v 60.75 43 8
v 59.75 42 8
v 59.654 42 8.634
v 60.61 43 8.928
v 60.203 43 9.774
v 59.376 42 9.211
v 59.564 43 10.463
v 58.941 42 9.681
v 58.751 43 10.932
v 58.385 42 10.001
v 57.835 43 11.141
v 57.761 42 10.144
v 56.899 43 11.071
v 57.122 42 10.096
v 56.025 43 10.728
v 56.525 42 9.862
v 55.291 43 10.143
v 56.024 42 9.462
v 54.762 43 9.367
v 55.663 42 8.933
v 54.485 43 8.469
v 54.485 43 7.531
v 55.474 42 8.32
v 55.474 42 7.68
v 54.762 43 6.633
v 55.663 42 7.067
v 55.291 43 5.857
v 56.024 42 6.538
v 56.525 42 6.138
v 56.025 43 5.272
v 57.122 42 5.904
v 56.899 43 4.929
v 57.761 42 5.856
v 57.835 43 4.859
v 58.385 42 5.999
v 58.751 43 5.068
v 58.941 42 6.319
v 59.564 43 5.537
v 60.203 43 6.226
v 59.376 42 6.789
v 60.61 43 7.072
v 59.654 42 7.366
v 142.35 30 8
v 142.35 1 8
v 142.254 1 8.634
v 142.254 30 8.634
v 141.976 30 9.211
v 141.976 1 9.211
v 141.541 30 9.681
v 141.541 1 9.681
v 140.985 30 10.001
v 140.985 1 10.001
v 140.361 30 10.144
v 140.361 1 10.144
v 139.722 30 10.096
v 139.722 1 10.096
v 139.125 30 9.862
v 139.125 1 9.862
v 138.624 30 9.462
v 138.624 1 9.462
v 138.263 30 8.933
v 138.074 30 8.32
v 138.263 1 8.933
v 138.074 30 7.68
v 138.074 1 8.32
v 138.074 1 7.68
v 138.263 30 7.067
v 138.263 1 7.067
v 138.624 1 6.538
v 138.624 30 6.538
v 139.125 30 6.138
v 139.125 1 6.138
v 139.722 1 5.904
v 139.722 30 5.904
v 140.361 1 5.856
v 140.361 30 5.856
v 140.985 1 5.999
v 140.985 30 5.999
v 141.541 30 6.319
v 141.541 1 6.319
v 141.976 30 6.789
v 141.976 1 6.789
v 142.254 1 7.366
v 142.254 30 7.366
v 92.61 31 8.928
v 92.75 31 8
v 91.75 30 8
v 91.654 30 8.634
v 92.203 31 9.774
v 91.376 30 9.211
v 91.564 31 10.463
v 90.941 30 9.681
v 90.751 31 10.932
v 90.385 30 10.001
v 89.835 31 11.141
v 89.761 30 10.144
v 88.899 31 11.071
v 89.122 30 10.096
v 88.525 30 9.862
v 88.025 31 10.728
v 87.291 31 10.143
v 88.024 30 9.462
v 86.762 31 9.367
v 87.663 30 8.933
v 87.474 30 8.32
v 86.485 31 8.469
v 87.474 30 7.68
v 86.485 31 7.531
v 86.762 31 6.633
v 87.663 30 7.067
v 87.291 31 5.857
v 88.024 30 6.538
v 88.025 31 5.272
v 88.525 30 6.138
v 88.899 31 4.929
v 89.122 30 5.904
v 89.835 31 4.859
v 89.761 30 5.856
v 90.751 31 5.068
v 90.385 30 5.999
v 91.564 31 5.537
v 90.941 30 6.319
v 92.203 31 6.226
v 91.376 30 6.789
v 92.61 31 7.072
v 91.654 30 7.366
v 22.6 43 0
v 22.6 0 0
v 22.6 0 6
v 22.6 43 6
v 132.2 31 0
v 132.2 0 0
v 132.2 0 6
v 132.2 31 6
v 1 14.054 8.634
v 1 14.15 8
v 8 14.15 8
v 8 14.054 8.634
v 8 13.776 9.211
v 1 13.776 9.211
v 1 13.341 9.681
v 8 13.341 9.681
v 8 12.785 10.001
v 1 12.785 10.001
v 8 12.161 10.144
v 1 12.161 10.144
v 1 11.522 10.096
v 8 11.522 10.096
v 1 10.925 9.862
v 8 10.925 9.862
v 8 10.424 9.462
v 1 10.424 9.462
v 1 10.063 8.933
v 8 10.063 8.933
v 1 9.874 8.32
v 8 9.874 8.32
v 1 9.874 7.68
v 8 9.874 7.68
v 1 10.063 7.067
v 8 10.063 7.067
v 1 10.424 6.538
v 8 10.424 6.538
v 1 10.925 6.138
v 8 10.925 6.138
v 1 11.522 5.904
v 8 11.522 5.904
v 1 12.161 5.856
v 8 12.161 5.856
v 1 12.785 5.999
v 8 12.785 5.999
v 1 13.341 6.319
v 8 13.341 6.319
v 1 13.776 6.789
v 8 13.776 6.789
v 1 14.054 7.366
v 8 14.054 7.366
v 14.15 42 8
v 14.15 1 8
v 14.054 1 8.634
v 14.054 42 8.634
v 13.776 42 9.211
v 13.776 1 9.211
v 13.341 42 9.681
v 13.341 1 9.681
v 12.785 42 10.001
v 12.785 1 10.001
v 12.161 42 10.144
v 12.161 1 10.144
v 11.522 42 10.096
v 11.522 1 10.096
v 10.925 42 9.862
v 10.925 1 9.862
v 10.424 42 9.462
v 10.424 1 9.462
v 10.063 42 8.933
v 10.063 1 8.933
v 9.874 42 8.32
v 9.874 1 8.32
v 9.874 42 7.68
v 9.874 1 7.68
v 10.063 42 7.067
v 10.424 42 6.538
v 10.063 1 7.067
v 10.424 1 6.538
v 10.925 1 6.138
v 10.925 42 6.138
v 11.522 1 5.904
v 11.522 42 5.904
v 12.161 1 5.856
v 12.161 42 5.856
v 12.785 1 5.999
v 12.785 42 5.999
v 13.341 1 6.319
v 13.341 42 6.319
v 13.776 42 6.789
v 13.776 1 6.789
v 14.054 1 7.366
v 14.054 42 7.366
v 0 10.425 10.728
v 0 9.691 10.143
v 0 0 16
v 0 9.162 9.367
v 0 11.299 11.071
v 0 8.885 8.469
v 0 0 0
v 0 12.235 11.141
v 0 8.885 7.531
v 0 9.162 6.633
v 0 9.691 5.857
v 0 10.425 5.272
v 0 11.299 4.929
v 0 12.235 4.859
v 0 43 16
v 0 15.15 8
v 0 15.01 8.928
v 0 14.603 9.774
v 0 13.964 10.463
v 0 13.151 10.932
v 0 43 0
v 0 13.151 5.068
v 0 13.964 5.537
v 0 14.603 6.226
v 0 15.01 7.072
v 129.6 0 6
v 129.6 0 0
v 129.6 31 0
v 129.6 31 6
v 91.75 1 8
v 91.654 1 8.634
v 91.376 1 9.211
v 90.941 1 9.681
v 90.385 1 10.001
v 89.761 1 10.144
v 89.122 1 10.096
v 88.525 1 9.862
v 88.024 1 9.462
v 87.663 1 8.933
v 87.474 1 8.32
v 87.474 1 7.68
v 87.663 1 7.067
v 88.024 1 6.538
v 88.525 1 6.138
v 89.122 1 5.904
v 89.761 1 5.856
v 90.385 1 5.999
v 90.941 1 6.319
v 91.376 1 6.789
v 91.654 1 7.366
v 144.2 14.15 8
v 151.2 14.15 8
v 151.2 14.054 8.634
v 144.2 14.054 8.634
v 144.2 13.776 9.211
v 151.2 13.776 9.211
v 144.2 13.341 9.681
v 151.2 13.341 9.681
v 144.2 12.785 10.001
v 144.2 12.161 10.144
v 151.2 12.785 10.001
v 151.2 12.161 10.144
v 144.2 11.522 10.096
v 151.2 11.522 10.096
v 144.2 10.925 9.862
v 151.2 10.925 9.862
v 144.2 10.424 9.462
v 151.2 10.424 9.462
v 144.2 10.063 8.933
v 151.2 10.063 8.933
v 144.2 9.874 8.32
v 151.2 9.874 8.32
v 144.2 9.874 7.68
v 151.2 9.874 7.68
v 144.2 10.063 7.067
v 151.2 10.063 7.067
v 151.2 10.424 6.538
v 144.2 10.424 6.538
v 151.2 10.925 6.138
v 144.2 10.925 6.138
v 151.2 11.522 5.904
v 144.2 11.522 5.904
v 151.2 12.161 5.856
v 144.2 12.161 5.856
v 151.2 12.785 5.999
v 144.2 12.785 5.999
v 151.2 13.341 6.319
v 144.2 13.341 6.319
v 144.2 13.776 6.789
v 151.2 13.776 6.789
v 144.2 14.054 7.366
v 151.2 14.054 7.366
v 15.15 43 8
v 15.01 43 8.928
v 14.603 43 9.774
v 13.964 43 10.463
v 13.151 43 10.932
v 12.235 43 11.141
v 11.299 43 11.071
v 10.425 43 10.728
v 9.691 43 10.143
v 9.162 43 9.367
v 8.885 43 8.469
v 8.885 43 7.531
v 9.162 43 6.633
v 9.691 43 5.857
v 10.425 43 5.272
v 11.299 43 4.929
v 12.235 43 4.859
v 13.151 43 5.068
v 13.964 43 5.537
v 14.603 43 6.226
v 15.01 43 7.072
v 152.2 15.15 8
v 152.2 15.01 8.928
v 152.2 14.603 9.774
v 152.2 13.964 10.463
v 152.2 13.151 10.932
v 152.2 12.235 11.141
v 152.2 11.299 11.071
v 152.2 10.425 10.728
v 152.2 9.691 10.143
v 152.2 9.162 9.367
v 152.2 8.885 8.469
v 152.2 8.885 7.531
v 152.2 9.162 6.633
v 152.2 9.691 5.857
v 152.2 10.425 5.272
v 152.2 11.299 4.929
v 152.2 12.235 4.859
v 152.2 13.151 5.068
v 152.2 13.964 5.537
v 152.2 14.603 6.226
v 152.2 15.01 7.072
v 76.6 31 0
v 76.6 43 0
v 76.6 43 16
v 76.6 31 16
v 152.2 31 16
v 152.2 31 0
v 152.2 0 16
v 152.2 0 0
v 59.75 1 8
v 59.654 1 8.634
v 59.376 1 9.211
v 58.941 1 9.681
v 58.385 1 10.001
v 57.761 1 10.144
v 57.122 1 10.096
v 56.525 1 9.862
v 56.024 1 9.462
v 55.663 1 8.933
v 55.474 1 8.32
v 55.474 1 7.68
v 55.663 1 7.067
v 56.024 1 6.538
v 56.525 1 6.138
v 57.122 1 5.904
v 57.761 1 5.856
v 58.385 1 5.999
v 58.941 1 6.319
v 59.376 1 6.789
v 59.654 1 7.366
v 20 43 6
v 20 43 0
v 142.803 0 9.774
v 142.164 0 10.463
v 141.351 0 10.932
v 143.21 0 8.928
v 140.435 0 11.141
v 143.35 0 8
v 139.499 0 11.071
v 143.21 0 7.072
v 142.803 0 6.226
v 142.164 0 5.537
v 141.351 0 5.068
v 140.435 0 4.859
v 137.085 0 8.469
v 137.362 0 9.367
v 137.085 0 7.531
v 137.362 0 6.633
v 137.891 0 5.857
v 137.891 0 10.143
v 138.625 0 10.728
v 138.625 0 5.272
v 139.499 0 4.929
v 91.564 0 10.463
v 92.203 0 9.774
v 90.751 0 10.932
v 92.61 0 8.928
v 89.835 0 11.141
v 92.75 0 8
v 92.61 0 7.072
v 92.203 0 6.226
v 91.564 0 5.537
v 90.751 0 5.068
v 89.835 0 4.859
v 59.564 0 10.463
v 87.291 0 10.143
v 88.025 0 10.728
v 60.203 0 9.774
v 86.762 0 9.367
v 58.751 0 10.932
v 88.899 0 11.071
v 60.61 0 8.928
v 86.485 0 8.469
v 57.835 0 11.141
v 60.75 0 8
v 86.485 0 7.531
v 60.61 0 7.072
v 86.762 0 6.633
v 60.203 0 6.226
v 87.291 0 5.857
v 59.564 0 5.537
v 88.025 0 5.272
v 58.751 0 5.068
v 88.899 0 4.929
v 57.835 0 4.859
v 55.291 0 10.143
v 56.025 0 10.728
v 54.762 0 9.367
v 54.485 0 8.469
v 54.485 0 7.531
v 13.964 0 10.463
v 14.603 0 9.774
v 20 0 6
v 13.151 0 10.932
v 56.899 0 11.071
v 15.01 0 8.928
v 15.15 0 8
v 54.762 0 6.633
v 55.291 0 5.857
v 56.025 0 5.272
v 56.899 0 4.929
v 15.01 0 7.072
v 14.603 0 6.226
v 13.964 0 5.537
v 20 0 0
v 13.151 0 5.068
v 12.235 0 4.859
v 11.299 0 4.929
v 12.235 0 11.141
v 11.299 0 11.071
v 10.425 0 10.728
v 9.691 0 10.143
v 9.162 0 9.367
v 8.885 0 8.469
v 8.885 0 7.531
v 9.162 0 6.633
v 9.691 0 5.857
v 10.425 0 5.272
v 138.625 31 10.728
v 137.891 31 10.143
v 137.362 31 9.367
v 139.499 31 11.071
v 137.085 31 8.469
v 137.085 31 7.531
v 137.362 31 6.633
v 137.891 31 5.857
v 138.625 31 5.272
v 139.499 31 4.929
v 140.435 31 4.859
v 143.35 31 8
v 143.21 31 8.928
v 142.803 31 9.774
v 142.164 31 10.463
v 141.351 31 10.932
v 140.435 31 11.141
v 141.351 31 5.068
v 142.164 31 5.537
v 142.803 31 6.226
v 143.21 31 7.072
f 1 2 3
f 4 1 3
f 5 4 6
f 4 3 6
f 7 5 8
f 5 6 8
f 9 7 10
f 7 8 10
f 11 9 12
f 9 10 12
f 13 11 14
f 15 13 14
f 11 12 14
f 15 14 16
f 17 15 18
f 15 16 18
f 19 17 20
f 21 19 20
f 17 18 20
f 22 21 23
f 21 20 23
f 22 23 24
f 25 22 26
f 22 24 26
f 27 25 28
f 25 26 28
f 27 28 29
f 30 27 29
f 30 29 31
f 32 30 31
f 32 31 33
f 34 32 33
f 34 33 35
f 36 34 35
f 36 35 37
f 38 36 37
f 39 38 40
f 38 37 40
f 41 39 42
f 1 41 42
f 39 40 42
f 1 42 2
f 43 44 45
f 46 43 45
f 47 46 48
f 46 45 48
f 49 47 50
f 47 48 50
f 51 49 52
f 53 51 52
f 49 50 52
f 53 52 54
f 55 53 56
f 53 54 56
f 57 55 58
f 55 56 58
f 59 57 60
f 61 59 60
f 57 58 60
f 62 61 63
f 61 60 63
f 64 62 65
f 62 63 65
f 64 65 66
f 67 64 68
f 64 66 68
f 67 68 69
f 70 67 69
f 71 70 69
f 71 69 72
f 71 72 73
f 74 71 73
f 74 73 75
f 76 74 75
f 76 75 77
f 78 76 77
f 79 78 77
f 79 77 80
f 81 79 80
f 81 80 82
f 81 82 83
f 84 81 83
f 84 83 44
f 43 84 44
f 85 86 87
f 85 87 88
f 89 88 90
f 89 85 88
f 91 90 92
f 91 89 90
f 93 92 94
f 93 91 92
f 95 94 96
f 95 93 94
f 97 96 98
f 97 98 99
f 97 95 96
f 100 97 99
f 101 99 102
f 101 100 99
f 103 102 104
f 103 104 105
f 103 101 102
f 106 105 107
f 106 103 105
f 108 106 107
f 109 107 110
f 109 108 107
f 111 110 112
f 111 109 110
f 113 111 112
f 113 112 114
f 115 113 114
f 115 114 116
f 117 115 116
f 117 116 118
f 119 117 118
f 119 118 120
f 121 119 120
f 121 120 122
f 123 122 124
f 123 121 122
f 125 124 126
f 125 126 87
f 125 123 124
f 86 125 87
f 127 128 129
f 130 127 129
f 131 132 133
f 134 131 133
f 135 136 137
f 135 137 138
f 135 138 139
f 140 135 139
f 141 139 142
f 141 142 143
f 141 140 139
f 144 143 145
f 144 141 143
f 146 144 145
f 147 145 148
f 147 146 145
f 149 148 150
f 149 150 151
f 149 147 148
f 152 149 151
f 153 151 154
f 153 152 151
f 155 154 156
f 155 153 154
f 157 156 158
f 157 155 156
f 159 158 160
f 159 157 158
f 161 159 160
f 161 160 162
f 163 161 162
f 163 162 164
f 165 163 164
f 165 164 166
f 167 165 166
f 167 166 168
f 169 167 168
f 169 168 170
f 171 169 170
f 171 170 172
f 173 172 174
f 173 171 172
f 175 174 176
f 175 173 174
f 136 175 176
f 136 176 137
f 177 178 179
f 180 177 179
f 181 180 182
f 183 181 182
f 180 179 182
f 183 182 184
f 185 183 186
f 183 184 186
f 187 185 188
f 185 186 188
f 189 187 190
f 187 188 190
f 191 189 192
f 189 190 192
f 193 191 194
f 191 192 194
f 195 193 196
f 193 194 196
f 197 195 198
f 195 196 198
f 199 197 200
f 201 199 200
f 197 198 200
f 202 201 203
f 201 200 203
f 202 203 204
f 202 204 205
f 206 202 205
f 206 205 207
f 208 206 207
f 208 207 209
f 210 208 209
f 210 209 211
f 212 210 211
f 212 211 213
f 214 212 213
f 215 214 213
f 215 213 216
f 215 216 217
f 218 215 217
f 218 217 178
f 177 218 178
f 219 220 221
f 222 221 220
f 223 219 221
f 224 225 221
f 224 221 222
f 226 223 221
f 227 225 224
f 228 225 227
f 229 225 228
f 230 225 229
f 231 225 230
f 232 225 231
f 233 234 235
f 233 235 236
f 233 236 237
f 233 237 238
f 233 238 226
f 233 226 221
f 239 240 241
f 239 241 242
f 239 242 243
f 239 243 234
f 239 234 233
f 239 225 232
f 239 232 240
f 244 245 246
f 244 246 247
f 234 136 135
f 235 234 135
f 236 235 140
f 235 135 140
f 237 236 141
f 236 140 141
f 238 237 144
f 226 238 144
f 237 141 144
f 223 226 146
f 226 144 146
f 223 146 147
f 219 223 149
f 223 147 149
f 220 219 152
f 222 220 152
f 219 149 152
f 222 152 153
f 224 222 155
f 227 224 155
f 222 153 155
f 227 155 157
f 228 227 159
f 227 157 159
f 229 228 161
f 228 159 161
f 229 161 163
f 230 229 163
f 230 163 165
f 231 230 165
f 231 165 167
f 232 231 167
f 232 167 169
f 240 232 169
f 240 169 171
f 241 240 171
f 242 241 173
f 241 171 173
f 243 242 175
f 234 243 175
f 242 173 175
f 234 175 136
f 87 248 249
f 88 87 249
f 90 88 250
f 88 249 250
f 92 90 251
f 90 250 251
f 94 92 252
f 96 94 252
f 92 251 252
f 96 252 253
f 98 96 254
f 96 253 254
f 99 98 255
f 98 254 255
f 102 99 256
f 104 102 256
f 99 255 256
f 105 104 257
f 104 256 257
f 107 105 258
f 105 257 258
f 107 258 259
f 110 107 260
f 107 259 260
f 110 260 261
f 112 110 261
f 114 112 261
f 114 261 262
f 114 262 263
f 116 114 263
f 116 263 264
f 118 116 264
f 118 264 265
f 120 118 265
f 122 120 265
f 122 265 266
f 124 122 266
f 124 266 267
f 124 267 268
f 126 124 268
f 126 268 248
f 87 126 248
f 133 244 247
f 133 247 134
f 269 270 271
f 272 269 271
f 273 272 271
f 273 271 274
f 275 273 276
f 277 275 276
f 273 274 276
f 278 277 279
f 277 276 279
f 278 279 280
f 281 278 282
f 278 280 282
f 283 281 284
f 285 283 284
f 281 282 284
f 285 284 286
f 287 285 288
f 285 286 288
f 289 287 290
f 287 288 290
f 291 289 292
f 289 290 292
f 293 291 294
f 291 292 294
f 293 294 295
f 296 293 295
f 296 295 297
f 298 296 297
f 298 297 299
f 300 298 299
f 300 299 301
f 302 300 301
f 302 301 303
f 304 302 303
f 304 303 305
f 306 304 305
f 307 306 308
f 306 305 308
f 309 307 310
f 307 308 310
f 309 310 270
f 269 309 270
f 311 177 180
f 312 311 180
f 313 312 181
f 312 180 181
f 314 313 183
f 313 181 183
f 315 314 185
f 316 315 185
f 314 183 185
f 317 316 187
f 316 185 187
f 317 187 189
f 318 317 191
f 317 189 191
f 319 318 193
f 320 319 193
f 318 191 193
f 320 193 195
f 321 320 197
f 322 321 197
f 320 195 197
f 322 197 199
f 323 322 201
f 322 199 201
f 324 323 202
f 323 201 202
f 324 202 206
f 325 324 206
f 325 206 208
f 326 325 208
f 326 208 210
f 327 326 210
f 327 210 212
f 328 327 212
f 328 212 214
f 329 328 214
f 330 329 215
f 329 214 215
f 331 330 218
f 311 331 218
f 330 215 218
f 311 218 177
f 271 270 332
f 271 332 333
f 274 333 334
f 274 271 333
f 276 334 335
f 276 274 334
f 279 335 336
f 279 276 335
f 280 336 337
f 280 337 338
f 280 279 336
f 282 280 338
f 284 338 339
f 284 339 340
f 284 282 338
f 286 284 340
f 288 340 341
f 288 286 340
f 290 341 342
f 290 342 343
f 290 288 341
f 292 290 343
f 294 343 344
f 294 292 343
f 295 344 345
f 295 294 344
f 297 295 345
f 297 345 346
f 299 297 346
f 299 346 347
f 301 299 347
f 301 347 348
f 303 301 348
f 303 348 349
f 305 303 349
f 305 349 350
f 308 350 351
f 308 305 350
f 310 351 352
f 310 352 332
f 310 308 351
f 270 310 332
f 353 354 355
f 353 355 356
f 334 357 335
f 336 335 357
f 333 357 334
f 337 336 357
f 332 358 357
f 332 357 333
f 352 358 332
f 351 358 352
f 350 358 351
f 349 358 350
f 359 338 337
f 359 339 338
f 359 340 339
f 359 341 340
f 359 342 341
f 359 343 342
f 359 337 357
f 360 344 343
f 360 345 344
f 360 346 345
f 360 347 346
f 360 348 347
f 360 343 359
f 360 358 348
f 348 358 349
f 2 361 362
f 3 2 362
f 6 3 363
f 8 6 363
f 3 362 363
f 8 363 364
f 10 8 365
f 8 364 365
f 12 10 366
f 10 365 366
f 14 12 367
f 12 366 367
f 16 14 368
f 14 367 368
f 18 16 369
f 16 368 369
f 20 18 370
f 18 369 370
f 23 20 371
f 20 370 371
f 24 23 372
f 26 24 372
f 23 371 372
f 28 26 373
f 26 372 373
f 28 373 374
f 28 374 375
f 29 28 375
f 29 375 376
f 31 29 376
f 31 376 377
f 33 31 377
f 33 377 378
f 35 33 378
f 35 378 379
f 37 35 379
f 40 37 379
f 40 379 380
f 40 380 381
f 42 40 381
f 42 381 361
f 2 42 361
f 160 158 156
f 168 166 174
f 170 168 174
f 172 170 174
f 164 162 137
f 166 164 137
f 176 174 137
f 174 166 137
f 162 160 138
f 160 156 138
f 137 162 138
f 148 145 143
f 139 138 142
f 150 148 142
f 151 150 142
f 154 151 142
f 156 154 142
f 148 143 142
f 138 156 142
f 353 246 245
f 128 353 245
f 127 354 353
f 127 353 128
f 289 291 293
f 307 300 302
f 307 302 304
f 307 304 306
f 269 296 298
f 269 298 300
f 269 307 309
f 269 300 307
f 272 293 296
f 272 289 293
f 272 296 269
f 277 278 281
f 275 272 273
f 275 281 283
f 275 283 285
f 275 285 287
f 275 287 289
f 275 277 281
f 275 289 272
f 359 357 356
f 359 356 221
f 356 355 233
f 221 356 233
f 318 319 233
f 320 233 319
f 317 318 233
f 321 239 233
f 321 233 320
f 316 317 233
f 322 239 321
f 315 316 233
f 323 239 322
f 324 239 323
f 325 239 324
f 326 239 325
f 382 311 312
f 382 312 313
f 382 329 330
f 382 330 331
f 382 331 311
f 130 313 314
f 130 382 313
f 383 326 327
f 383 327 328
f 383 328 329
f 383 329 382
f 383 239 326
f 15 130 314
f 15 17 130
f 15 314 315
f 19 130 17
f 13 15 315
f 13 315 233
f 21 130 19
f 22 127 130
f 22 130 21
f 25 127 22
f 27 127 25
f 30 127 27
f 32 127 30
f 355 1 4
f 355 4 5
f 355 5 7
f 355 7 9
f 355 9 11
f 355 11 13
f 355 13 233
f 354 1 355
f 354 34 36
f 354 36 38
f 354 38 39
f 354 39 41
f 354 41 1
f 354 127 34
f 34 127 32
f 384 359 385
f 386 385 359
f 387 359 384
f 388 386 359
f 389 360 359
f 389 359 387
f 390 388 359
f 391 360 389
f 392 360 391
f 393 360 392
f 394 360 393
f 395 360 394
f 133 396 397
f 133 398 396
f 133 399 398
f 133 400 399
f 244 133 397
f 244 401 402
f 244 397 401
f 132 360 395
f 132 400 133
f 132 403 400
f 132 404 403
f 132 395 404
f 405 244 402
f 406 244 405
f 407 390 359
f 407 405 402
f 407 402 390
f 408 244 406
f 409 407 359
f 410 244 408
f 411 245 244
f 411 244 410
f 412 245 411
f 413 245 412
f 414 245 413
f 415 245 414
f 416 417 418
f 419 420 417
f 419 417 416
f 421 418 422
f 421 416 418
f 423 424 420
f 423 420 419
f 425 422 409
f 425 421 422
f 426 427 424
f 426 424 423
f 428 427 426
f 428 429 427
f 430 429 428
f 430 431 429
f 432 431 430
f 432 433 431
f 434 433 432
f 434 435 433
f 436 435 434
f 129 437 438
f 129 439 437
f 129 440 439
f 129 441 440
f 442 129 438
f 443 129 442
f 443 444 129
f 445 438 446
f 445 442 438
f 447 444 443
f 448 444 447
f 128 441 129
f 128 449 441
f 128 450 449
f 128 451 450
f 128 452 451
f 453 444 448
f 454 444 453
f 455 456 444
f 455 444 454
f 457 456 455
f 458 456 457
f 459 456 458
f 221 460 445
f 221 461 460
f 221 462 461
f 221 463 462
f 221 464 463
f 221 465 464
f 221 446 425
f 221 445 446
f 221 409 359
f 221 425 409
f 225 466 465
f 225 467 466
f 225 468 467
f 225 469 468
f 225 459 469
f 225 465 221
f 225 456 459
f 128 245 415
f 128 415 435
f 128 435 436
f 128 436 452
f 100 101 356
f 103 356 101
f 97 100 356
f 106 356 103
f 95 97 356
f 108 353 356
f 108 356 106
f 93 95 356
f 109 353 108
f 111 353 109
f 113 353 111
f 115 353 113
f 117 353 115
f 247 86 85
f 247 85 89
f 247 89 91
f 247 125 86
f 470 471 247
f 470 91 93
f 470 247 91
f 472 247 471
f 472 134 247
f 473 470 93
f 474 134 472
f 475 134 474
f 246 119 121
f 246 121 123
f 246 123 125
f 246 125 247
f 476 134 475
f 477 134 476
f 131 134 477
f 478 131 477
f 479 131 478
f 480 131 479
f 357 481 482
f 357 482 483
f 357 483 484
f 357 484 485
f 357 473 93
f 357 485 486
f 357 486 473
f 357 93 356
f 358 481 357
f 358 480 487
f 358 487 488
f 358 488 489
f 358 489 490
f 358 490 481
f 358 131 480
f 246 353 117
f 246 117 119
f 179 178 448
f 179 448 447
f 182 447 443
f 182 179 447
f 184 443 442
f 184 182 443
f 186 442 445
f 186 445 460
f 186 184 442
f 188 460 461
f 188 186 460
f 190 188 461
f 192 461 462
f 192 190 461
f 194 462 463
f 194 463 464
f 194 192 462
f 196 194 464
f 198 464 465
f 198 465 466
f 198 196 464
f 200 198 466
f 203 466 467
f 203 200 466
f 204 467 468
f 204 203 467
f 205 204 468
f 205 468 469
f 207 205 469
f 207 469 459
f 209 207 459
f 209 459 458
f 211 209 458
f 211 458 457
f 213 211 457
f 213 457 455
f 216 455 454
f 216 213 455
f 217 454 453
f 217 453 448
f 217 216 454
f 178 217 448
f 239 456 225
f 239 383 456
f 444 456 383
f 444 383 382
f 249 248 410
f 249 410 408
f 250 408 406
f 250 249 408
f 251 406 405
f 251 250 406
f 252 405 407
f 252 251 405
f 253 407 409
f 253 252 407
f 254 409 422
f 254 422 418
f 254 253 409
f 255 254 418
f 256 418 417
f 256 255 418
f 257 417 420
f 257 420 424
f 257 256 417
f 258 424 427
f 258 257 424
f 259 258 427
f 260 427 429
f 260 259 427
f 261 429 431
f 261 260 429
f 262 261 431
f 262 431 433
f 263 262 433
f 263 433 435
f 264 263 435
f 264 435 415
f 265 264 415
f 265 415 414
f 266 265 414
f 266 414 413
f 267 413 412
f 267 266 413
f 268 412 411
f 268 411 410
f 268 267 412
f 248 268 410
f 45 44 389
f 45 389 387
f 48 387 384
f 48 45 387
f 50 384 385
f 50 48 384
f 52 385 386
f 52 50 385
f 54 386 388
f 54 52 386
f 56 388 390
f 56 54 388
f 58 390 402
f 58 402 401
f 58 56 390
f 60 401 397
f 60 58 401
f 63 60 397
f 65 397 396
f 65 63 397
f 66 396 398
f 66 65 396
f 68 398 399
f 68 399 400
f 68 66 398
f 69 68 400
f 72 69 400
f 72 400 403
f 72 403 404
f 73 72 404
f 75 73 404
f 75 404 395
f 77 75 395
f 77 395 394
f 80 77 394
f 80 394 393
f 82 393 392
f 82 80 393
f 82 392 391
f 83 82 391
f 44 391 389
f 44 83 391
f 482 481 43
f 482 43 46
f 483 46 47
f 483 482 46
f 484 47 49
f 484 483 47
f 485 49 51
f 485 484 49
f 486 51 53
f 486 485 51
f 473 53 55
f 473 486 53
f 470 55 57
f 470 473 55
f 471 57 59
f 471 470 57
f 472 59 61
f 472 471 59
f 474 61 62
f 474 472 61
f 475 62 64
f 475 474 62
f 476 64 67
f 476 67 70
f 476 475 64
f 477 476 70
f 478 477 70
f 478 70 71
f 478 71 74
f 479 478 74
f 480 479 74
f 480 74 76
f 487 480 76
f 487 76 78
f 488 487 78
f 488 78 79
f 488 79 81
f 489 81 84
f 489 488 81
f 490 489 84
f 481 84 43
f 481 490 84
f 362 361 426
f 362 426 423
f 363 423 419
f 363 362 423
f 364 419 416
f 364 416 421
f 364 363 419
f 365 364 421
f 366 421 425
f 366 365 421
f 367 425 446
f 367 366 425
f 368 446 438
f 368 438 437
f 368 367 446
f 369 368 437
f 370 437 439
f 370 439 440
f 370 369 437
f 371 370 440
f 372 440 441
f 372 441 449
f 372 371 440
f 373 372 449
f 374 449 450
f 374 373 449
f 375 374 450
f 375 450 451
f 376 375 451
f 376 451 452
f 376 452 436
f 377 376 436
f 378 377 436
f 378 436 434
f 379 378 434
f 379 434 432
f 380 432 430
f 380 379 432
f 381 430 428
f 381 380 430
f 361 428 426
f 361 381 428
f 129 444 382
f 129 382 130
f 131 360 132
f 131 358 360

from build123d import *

# Parameters (mm, degrees)
PAD_DEPTH       = 16
SKETCH001_R     = 2.15
SKETCH001_W     = 2.6
SKETCH001_H     = 6
POCKET_DEPTH    = 43.001
SKETCH002_R     = 2.15
POCKET001_DEPTH = 8
SKETCH003_R     = 2.15
POCKET002_DEPTH = 8
CHAMFER_SIZE    = 1


with BuildPart() as part:
    # Sketch → Pad (new body)
    with BuildSketch(Plane.XY):
        Polygon((0, 0), (0, 43), (76.6, 43), (76.6, 31), (152.2, 31), (152.2, 0), align=None)
    extrude(amount=PAD_DEPTH)

    # Sketch001 → Pocket (cut, through all)
    with BuildSketch(Plane.XZ):
        with Locations((12, 8)):
            Circle(SKETCH001_R)
        with Locations((89.6, 8)):
            Circle(SKETCH001_R)
        with Locations((140.2, 8)):
            Circle(SKETCH001_R)
        with Locations((57.6, 8)):
            Circle(SKETCH001_R)
        with Locations((21.3, 3)):
            Rectangle(SKETCH001_W, SKETCH001_H)
        with Locations((130.9, 3)):
            Rectangle(SKETCH001_W, SKETCH001_H)
    extrude(amount=-POCKET_DEPTH, mode=Mode.SUBTRACT)

    # Sketch002 → Pocket001 (cut)
    with BuildSketch(Plane.YZ):
        with Locations((12, 8)):
            Circle(SKETCH002_R)
    extrude(amount=POCKET001_DEPTH, mode=Mode.SUBTRACT)

    # Sketch003 (on DatumPlane) → Pocket002 (cut)
    with BuildSketch(Plane.YZ.offset(152.2)):
        with Locations((12, 8)):
            Circle(SKETCH003_R)
    extrude(amount=-POCKET002_DEPTH, mode=Mode.SUBTRACT)

    # Chamfer
    chamfer_edges = [part.edges().sort_by_distance(p)[0] for p in [
        (0, 9.85, 8),
        (9.85, 0, 8),
        (55.45, 0, 8),
        (87.45, 0, 8),
        (138.05, 0, 8),
        (152.2, 9.85, 8),
        (138.05, 31, 8),
        (87.45, 31, 8),
        (55.45, 43, 8),
        (9.85, 43, 8),
    ]]
    chamfer(chamfer_edges, length=CHAMFER_SIZE)


solid = part.part
